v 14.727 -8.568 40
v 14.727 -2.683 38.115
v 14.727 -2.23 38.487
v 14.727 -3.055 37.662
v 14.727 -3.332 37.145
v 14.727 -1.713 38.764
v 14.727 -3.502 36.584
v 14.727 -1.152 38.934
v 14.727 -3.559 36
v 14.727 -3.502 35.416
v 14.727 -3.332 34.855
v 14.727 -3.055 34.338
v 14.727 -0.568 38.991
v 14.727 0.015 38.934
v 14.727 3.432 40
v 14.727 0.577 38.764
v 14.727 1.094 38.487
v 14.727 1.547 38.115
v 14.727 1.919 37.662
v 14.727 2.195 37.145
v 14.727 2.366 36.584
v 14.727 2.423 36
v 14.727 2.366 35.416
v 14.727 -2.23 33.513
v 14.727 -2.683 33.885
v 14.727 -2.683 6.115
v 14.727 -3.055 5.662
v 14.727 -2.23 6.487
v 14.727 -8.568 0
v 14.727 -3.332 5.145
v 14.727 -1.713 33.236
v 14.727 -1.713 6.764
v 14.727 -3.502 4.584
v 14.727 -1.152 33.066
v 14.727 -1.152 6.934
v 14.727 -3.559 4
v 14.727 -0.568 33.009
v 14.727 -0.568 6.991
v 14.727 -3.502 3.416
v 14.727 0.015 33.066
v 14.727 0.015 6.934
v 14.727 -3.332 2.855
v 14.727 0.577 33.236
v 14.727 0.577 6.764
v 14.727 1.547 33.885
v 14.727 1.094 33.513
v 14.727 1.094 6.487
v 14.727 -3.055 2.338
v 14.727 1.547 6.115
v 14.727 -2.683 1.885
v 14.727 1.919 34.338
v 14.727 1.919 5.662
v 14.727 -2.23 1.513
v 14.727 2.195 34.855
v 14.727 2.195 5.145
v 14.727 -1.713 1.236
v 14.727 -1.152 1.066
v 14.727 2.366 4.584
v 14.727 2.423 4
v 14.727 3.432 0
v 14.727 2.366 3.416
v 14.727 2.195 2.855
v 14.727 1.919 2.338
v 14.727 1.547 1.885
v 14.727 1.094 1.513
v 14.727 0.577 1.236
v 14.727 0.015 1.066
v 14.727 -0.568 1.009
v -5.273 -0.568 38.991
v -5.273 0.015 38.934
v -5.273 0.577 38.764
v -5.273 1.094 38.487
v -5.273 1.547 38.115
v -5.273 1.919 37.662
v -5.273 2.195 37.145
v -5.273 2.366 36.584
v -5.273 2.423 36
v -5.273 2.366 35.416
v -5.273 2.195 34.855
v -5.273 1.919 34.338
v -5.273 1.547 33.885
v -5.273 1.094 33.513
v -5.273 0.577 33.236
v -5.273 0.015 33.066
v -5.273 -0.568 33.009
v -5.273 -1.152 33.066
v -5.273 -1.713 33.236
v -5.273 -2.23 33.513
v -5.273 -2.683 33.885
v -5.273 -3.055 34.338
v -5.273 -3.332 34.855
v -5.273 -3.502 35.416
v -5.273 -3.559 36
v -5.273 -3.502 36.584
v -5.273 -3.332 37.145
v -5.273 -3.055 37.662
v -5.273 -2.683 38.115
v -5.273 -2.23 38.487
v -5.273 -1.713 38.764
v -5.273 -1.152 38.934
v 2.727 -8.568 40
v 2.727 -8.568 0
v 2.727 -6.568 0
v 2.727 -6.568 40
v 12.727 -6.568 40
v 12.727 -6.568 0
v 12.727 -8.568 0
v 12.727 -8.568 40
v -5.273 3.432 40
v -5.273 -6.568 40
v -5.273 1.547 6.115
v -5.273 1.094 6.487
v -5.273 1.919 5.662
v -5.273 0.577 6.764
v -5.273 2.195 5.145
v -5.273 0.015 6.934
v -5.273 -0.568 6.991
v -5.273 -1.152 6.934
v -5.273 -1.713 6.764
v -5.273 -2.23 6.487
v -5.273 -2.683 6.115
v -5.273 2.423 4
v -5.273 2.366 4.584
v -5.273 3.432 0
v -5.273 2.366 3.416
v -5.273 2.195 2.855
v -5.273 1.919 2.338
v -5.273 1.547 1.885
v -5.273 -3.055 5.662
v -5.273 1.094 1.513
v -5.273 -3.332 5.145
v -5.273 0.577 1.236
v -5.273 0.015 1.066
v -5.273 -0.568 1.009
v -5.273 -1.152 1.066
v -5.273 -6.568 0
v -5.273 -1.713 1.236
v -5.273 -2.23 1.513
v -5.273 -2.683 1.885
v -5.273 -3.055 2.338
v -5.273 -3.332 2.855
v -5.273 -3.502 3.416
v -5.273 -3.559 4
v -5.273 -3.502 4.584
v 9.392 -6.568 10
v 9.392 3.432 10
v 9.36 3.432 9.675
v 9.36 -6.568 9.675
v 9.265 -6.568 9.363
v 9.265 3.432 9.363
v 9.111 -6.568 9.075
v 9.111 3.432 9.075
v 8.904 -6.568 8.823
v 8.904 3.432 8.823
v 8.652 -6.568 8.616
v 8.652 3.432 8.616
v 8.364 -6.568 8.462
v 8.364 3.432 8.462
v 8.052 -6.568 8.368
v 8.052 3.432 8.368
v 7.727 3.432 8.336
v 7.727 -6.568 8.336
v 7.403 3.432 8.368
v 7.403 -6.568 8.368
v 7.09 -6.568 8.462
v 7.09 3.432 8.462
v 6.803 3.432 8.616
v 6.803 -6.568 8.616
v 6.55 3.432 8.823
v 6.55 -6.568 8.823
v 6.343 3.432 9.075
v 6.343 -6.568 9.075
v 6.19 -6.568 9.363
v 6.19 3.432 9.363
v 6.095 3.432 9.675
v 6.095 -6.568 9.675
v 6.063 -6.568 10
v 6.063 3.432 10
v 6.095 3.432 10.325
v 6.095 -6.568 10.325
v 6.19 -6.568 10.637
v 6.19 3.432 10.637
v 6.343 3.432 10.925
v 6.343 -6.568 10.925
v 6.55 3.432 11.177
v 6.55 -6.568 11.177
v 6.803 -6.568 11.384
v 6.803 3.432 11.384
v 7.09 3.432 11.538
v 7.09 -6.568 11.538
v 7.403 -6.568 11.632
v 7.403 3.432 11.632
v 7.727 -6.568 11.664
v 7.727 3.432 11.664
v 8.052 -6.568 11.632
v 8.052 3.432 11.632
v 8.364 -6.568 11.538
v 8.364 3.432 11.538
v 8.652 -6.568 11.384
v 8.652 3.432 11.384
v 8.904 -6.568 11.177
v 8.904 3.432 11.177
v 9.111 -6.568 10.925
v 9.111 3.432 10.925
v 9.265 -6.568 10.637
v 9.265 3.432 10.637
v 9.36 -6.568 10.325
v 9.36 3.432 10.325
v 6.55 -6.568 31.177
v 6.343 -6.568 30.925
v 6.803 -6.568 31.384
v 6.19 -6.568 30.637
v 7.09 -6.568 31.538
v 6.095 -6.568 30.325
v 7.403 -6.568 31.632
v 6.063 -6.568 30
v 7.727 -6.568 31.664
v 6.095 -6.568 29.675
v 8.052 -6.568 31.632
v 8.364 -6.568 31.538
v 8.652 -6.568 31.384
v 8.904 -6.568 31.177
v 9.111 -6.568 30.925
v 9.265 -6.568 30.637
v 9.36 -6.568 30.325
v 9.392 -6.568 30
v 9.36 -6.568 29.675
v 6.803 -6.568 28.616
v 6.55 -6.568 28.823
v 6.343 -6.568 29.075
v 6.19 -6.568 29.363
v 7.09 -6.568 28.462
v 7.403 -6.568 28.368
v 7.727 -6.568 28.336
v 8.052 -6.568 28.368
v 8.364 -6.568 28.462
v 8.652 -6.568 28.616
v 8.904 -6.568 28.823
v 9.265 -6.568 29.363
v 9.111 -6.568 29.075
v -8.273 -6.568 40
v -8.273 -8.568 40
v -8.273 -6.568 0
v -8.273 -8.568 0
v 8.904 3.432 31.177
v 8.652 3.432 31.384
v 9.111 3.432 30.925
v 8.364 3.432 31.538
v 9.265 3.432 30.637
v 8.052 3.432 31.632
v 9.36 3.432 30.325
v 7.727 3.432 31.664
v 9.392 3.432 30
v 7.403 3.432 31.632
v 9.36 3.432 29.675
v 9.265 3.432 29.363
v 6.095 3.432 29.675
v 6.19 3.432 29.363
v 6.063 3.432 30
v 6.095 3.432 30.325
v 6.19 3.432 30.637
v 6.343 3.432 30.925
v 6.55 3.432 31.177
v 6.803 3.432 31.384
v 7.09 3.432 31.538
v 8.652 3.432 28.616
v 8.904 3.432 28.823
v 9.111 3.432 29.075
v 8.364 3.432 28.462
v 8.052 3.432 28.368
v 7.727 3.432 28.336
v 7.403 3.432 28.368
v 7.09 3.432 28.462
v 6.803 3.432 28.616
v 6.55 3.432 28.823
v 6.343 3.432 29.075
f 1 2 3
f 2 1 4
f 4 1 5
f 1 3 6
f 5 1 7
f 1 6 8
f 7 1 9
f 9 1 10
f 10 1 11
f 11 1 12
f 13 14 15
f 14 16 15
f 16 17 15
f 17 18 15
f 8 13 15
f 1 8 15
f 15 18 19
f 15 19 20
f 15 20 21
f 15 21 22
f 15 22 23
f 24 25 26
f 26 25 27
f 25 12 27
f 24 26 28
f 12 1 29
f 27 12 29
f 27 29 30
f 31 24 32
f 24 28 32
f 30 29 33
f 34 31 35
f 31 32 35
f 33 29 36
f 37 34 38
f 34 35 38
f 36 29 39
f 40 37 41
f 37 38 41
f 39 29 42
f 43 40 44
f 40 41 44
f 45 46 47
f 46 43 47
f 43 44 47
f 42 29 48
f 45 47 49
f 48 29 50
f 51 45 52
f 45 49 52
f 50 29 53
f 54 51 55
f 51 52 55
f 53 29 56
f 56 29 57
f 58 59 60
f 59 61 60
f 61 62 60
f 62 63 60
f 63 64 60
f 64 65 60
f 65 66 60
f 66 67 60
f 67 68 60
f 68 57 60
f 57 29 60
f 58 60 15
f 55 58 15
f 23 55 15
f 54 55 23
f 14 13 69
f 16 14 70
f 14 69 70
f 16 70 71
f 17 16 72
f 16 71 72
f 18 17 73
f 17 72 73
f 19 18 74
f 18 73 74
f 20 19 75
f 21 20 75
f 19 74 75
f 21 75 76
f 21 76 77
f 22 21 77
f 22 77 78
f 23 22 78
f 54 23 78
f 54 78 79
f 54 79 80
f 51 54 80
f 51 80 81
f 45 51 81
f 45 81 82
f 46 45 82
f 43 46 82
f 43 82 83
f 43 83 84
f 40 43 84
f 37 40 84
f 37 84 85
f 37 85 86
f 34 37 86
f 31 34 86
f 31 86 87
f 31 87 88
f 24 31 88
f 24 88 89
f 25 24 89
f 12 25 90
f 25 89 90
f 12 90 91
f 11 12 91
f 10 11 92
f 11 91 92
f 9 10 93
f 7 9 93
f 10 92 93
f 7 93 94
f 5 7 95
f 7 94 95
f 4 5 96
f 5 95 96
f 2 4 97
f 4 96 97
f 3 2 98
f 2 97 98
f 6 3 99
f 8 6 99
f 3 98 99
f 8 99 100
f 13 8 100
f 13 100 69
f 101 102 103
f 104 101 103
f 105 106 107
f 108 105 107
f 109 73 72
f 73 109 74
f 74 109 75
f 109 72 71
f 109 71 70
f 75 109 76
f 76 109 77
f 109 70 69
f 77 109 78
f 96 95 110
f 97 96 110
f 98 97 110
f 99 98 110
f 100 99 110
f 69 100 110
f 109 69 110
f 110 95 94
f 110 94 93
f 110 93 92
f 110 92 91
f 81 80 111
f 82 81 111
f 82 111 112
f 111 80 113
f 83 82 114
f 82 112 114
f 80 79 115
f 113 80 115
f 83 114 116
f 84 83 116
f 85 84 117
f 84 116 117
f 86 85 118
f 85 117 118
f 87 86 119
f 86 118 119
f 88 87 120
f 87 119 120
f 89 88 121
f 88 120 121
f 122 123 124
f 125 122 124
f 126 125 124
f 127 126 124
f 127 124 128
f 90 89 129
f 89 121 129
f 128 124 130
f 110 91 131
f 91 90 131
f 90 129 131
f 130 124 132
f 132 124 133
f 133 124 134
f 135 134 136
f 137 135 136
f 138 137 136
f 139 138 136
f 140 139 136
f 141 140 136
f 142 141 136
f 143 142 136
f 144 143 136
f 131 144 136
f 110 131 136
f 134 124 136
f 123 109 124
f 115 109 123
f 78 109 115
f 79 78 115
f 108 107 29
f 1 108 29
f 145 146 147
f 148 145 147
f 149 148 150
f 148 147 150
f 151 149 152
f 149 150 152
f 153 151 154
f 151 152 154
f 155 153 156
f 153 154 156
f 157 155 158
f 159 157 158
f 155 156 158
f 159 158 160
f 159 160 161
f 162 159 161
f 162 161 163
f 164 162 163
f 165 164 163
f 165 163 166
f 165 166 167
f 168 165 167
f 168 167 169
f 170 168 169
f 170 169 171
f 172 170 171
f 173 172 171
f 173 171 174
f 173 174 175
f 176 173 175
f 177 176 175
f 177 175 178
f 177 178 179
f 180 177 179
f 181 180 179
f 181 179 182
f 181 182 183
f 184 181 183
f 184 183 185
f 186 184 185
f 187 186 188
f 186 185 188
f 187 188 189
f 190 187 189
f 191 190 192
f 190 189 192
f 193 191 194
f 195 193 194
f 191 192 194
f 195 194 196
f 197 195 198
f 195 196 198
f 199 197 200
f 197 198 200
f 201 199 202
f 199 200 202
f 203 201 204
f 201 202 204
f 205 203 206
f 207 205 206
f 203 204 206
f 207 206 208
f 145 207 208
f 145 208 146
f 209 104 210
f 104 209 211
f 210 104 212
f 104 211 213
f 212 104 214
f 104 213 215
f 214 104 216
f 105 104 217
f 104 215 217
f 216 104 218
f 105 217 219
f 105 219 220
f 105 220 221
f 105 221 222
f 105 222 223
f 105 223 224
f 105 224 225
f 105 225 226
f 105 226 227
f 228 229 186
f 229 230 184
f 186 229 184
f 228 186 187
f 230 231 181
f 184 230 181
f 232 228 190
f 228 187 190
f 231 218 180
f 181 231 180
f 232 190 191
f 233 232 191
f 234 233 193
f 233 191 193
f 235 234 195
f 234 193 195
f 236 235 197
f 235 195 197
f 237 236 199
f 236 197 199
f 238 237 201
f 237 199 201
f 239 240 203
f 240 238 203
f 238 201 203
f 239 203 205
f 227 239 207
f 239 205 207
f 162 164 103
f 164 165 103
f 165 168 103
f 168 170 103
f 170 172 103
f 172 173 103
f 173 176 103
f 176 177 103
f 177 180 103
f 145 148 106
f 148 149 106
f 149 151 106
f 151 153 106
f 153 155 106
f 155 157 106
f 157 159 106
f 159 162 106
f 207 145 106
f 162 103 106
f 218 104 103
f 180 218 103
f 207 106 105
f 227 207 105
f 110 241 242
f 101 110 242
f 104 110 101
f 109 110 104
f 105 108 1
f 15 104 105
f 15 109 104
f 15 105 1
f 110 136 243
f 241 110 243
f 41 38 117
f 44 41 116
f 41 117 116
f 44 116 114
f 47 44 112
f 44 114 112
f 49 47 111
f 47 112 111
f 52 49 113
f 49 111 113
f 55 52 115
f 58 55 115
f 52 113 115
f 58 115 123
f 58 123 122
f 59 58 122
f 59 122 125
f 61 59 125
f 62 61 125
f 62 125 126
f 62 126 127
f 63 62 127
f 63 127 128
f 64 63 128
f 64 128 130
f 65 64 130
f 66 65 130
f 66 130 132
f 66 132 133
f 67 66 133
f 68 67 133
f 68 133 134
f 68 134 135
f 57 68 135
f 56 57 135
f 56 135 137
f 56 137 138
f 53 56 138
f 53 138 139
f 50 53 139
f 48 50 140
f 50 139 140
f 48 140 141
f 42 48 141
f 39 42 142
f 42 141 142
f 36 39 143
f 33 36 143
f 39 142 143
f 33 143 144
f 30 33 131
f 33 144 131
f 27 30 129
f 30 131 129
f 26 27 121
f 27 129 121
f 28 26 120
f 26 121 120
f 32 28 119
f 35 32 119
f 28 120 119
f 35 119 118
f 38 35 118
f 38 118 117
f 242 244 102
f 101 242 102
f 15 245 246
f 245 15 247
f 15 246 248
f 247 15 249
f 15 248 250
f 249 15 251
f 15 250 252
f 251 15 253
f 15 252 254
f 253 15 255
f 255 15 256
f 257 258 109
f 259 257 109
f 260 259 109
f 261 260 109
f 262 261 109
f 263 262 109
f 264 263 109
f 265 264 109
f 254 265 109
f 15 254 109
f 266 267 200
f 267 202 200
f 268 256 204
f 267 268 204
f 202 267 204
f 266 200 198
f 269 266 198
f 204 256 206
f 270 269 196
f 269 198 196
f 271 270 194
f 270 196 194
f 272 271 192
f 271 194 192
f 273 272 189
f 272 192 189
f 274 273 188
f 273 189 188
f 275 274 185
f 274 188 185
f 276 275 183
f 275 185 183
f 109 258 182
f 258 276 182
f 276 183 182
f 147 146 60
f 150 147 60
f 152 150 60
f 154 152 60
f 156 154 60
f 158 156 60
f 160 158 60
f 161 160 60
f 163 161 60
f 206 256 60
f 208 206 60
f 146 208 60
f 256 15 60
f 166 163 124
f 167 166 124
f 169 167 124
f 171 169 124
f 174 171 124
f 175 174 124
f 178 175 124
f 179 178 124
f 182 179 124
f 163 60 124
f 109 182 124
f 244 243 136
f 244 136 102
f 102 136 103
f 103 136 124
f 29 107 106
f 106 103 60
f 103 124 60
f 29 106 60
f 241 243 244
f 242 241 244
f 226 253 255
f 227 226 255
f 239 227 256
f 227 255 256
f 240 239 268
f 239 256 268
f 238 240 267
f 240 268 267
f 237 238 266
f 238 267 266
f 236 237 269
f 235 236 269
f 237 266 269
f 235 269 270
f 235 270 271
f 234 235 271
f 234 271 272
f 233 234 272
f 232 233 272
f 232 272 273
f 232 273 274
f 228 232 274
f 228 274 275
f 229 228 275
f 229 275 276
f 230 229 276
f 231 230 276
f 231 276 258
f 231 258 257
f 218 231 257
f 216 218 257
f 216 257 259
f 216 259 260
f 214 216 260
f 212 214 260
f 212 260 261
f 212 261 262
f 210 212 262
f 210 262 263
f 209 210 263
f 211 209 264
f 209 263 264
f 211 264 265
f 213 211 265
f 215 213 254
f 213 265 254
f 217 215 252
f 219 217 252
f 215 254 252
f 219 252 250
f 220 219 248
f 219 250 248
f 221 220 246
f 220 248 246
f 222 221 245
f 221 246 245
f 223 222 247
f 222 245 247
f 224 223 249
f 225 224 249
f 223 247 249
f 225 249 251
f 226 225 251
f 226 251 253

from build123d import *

# Parameters (mm, degrees)
BOSS_EXTRUDE1_DEPTH = 40
SKETCH2_R           = 2.991229743
CUT_EXTRUDE1_DEPTH  = 21
SKETCH3_R           = 1.664454023
CUT_EXTRUDE2_DEPTH  = 40


with BuildPart() as part:
    # Sketch1 → Boss-Extrude1 (new body)
    with BuildSketch(Plane.XY):
        Polygon((12.727272727, -8.568181818), (14.727272727, -8.568181818), (14.727272727, 3.431818182), (-5.272727273, 3.431818182), (-5.272727273, -6.568181818), (-8.272727273, -6.568181818), (-8.272727273, -8.568181818), (2.727272727, -8.568181818), (2.727272727, -6.568181818), (12.727272727, -6.568181818), align=None)
    extrude(amount=BOSS_EXTRUDE1_DEPTH)

    # Sketch2 → Cut-Extrude1 (cut, through all)
    with BuildSketch(Plane.ZY.offset(5.272727273)):
        with Locations((4, -0.568181818)):
            Circle(SKETCH2_R)
        with Locations((36, -0.568181818)):
            Circle(SKETCH2_R)
    extrude(amount=-CUT_EXTRUDE1_DEPTH, mode=Mode.SUBTRACT)

    # Sketch3 → Cut-Extrude2 (cut)
    with BuildSketch(Plane(origin=(0, 3.431818182, 0), x_dir=(1, 0, 0), z_dir=(0, 1, 0))):
        with Locations((7.727272727, -30)):
            Circle(SKETCH3_R)
        with Locations((7.727272727, -10)):
            Circle(SKETCH3_R)
    extrude(amount=-CUT_EXTRUDE2_DEPTH, mode=Mode.SUBTRACT)


solid = part.part
